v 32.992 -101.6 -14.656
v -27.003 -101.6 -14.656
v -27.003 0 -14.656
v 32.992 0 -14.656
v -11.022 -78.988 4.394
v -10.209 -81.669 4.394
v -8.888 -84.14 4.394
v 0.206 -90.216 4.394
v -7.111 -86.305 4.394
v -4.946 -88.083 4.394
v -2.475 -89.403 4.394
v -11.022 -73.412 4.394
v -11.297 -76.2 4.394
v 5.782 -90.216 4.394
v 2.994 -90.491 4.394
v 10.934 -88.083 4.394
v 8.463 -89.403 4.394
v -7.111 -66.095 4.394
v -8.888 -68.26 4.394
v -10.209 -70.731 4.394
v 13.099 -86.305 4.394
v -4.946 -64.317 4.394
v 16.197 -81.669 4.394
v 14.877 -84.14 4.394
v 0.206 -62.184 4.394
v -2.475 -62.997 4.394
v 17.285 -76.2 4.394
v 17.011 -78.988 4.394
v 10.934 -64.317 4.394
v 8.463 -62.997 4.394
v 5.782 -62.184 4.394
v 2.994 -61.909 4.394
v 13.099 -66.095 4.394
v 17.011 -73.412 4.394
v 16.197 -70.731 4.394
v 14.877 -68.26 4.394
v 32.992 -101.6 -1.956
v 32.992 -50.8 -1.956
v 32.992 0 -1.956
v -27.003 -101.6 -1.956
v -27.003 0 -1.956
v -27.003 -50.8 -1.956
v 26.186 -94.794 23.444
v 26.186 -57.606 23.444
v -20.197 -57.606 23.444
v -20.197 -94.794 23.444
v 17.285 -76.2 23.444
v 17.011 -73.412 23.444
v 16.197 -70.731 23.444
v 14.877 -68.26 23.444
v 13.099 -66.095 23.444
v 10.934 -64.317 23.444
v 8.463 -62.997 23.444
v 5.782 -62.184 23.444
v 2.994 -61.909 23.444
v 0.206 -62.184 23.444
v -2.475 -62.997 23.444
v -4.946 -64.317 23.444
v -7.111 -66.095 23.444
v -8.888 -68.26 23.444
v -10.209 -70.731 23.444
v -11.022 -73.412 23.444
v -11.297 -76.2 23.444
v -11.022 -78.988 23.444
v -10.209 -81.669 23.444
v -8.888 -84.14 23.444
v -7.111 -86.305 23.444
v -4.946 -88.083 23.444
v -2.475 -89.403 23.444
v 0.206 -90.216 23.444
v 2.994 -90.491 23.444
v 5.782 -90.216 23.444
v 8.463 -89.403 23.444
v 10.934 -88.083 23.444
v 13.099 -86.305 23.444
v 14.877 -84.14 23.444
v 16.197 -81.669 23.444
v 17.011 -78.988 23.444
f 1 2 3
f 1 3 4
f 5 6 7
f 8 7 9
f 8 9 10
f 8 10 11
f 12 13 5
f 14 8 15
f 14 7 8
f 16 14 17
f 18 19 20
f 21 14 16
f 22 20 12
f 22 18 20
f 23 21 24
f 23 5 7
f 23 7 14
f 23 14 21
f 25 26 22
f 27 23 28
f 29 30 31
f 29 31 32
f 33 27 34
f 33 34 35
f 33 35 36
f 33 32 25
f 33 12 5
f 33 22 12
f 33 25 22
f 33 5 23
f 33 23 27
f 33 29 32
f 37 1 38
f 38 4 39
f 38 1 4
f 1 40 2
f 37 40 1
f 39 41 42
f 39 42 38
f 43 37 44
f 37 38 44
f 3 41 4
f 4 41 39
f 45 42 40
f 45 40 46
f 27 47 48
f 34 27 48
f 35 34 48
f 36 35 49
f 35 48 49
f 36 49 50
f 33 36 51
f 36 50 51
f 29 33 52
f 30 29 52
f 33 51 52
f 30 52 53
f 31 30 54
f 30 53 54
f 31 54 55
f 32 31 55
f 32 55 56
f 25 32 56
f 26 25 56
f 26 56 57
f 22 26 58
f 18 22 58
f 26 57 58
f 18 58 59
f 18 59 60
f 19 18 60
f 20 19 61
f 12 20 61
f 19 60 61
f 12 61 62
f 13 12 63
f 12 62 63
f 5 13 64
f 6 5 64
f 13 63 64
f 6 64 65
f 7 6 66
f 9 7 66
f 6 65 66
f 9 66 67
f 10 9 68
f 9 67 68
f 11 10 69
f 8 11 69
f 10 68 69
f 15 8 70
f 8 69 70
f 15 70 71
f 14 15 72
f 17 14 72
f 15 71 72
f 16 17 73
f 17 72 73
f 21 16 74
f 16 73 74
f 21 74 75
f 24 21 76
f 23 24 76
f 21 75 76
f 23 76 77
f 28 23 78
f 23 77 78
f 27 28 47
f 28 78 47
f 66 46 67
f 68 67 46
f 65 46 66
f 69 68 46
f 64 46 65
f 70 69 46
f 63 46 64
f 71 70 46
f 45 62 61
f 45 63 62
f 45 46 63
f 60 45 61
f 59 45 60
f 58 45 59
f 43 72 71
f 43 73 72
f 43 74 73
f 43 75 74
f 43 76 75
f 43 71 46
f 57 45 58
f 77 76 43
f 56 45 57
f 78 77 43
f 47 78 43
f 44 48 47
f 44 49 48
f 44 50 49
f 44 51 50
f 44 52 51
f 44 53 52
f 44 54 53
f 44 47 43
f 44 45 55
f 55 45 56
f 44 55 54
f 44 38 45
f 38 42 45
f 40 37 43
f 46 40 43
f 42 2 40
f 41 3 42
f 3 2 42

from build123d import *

# Parameters (mm, degrees)
F0_W     = 59.9948
F0_H     = 12.7
F1_DEPTH = 101.6
F2_W     = 59.9948
F2_H     = 50.8
F3_DEPTH = 25.4
F3_TAPER = 15
F4_R     = 14.2909740927
F5_DEPTH = 19.05


with BuildPart() as f1:
    # F0 (on Front) → F1 (new body)
    with BuildSketch(Plane.XZ):
        with Locations((2.9941368848, -8.3058523926)):
            Rectangle(F0_W, F0_H)
    extrude(amount=F1_DEPTH)

    # F2 (on face) → F3 (join)
    with BuildSketch(Plane.XY.offset(-1.9558523926)):
        with Locations((2.9941368848, -76.2)):
            Rectangle(F2_W, F2_H)
    extrude(amount=F3_DEPTH, taper=F3_TAPER)

    # F4 (on face) → F5 (cut)
    with BuildSketch(Plane.XY.offset(23.4441476074)):
        with Locations((2.9941368848, -76.2)):
            Circle(F4_R)
    extrude(amount=-F5_DEPTH, mode=Mode.SUBTRACT)


solid = f1.part
